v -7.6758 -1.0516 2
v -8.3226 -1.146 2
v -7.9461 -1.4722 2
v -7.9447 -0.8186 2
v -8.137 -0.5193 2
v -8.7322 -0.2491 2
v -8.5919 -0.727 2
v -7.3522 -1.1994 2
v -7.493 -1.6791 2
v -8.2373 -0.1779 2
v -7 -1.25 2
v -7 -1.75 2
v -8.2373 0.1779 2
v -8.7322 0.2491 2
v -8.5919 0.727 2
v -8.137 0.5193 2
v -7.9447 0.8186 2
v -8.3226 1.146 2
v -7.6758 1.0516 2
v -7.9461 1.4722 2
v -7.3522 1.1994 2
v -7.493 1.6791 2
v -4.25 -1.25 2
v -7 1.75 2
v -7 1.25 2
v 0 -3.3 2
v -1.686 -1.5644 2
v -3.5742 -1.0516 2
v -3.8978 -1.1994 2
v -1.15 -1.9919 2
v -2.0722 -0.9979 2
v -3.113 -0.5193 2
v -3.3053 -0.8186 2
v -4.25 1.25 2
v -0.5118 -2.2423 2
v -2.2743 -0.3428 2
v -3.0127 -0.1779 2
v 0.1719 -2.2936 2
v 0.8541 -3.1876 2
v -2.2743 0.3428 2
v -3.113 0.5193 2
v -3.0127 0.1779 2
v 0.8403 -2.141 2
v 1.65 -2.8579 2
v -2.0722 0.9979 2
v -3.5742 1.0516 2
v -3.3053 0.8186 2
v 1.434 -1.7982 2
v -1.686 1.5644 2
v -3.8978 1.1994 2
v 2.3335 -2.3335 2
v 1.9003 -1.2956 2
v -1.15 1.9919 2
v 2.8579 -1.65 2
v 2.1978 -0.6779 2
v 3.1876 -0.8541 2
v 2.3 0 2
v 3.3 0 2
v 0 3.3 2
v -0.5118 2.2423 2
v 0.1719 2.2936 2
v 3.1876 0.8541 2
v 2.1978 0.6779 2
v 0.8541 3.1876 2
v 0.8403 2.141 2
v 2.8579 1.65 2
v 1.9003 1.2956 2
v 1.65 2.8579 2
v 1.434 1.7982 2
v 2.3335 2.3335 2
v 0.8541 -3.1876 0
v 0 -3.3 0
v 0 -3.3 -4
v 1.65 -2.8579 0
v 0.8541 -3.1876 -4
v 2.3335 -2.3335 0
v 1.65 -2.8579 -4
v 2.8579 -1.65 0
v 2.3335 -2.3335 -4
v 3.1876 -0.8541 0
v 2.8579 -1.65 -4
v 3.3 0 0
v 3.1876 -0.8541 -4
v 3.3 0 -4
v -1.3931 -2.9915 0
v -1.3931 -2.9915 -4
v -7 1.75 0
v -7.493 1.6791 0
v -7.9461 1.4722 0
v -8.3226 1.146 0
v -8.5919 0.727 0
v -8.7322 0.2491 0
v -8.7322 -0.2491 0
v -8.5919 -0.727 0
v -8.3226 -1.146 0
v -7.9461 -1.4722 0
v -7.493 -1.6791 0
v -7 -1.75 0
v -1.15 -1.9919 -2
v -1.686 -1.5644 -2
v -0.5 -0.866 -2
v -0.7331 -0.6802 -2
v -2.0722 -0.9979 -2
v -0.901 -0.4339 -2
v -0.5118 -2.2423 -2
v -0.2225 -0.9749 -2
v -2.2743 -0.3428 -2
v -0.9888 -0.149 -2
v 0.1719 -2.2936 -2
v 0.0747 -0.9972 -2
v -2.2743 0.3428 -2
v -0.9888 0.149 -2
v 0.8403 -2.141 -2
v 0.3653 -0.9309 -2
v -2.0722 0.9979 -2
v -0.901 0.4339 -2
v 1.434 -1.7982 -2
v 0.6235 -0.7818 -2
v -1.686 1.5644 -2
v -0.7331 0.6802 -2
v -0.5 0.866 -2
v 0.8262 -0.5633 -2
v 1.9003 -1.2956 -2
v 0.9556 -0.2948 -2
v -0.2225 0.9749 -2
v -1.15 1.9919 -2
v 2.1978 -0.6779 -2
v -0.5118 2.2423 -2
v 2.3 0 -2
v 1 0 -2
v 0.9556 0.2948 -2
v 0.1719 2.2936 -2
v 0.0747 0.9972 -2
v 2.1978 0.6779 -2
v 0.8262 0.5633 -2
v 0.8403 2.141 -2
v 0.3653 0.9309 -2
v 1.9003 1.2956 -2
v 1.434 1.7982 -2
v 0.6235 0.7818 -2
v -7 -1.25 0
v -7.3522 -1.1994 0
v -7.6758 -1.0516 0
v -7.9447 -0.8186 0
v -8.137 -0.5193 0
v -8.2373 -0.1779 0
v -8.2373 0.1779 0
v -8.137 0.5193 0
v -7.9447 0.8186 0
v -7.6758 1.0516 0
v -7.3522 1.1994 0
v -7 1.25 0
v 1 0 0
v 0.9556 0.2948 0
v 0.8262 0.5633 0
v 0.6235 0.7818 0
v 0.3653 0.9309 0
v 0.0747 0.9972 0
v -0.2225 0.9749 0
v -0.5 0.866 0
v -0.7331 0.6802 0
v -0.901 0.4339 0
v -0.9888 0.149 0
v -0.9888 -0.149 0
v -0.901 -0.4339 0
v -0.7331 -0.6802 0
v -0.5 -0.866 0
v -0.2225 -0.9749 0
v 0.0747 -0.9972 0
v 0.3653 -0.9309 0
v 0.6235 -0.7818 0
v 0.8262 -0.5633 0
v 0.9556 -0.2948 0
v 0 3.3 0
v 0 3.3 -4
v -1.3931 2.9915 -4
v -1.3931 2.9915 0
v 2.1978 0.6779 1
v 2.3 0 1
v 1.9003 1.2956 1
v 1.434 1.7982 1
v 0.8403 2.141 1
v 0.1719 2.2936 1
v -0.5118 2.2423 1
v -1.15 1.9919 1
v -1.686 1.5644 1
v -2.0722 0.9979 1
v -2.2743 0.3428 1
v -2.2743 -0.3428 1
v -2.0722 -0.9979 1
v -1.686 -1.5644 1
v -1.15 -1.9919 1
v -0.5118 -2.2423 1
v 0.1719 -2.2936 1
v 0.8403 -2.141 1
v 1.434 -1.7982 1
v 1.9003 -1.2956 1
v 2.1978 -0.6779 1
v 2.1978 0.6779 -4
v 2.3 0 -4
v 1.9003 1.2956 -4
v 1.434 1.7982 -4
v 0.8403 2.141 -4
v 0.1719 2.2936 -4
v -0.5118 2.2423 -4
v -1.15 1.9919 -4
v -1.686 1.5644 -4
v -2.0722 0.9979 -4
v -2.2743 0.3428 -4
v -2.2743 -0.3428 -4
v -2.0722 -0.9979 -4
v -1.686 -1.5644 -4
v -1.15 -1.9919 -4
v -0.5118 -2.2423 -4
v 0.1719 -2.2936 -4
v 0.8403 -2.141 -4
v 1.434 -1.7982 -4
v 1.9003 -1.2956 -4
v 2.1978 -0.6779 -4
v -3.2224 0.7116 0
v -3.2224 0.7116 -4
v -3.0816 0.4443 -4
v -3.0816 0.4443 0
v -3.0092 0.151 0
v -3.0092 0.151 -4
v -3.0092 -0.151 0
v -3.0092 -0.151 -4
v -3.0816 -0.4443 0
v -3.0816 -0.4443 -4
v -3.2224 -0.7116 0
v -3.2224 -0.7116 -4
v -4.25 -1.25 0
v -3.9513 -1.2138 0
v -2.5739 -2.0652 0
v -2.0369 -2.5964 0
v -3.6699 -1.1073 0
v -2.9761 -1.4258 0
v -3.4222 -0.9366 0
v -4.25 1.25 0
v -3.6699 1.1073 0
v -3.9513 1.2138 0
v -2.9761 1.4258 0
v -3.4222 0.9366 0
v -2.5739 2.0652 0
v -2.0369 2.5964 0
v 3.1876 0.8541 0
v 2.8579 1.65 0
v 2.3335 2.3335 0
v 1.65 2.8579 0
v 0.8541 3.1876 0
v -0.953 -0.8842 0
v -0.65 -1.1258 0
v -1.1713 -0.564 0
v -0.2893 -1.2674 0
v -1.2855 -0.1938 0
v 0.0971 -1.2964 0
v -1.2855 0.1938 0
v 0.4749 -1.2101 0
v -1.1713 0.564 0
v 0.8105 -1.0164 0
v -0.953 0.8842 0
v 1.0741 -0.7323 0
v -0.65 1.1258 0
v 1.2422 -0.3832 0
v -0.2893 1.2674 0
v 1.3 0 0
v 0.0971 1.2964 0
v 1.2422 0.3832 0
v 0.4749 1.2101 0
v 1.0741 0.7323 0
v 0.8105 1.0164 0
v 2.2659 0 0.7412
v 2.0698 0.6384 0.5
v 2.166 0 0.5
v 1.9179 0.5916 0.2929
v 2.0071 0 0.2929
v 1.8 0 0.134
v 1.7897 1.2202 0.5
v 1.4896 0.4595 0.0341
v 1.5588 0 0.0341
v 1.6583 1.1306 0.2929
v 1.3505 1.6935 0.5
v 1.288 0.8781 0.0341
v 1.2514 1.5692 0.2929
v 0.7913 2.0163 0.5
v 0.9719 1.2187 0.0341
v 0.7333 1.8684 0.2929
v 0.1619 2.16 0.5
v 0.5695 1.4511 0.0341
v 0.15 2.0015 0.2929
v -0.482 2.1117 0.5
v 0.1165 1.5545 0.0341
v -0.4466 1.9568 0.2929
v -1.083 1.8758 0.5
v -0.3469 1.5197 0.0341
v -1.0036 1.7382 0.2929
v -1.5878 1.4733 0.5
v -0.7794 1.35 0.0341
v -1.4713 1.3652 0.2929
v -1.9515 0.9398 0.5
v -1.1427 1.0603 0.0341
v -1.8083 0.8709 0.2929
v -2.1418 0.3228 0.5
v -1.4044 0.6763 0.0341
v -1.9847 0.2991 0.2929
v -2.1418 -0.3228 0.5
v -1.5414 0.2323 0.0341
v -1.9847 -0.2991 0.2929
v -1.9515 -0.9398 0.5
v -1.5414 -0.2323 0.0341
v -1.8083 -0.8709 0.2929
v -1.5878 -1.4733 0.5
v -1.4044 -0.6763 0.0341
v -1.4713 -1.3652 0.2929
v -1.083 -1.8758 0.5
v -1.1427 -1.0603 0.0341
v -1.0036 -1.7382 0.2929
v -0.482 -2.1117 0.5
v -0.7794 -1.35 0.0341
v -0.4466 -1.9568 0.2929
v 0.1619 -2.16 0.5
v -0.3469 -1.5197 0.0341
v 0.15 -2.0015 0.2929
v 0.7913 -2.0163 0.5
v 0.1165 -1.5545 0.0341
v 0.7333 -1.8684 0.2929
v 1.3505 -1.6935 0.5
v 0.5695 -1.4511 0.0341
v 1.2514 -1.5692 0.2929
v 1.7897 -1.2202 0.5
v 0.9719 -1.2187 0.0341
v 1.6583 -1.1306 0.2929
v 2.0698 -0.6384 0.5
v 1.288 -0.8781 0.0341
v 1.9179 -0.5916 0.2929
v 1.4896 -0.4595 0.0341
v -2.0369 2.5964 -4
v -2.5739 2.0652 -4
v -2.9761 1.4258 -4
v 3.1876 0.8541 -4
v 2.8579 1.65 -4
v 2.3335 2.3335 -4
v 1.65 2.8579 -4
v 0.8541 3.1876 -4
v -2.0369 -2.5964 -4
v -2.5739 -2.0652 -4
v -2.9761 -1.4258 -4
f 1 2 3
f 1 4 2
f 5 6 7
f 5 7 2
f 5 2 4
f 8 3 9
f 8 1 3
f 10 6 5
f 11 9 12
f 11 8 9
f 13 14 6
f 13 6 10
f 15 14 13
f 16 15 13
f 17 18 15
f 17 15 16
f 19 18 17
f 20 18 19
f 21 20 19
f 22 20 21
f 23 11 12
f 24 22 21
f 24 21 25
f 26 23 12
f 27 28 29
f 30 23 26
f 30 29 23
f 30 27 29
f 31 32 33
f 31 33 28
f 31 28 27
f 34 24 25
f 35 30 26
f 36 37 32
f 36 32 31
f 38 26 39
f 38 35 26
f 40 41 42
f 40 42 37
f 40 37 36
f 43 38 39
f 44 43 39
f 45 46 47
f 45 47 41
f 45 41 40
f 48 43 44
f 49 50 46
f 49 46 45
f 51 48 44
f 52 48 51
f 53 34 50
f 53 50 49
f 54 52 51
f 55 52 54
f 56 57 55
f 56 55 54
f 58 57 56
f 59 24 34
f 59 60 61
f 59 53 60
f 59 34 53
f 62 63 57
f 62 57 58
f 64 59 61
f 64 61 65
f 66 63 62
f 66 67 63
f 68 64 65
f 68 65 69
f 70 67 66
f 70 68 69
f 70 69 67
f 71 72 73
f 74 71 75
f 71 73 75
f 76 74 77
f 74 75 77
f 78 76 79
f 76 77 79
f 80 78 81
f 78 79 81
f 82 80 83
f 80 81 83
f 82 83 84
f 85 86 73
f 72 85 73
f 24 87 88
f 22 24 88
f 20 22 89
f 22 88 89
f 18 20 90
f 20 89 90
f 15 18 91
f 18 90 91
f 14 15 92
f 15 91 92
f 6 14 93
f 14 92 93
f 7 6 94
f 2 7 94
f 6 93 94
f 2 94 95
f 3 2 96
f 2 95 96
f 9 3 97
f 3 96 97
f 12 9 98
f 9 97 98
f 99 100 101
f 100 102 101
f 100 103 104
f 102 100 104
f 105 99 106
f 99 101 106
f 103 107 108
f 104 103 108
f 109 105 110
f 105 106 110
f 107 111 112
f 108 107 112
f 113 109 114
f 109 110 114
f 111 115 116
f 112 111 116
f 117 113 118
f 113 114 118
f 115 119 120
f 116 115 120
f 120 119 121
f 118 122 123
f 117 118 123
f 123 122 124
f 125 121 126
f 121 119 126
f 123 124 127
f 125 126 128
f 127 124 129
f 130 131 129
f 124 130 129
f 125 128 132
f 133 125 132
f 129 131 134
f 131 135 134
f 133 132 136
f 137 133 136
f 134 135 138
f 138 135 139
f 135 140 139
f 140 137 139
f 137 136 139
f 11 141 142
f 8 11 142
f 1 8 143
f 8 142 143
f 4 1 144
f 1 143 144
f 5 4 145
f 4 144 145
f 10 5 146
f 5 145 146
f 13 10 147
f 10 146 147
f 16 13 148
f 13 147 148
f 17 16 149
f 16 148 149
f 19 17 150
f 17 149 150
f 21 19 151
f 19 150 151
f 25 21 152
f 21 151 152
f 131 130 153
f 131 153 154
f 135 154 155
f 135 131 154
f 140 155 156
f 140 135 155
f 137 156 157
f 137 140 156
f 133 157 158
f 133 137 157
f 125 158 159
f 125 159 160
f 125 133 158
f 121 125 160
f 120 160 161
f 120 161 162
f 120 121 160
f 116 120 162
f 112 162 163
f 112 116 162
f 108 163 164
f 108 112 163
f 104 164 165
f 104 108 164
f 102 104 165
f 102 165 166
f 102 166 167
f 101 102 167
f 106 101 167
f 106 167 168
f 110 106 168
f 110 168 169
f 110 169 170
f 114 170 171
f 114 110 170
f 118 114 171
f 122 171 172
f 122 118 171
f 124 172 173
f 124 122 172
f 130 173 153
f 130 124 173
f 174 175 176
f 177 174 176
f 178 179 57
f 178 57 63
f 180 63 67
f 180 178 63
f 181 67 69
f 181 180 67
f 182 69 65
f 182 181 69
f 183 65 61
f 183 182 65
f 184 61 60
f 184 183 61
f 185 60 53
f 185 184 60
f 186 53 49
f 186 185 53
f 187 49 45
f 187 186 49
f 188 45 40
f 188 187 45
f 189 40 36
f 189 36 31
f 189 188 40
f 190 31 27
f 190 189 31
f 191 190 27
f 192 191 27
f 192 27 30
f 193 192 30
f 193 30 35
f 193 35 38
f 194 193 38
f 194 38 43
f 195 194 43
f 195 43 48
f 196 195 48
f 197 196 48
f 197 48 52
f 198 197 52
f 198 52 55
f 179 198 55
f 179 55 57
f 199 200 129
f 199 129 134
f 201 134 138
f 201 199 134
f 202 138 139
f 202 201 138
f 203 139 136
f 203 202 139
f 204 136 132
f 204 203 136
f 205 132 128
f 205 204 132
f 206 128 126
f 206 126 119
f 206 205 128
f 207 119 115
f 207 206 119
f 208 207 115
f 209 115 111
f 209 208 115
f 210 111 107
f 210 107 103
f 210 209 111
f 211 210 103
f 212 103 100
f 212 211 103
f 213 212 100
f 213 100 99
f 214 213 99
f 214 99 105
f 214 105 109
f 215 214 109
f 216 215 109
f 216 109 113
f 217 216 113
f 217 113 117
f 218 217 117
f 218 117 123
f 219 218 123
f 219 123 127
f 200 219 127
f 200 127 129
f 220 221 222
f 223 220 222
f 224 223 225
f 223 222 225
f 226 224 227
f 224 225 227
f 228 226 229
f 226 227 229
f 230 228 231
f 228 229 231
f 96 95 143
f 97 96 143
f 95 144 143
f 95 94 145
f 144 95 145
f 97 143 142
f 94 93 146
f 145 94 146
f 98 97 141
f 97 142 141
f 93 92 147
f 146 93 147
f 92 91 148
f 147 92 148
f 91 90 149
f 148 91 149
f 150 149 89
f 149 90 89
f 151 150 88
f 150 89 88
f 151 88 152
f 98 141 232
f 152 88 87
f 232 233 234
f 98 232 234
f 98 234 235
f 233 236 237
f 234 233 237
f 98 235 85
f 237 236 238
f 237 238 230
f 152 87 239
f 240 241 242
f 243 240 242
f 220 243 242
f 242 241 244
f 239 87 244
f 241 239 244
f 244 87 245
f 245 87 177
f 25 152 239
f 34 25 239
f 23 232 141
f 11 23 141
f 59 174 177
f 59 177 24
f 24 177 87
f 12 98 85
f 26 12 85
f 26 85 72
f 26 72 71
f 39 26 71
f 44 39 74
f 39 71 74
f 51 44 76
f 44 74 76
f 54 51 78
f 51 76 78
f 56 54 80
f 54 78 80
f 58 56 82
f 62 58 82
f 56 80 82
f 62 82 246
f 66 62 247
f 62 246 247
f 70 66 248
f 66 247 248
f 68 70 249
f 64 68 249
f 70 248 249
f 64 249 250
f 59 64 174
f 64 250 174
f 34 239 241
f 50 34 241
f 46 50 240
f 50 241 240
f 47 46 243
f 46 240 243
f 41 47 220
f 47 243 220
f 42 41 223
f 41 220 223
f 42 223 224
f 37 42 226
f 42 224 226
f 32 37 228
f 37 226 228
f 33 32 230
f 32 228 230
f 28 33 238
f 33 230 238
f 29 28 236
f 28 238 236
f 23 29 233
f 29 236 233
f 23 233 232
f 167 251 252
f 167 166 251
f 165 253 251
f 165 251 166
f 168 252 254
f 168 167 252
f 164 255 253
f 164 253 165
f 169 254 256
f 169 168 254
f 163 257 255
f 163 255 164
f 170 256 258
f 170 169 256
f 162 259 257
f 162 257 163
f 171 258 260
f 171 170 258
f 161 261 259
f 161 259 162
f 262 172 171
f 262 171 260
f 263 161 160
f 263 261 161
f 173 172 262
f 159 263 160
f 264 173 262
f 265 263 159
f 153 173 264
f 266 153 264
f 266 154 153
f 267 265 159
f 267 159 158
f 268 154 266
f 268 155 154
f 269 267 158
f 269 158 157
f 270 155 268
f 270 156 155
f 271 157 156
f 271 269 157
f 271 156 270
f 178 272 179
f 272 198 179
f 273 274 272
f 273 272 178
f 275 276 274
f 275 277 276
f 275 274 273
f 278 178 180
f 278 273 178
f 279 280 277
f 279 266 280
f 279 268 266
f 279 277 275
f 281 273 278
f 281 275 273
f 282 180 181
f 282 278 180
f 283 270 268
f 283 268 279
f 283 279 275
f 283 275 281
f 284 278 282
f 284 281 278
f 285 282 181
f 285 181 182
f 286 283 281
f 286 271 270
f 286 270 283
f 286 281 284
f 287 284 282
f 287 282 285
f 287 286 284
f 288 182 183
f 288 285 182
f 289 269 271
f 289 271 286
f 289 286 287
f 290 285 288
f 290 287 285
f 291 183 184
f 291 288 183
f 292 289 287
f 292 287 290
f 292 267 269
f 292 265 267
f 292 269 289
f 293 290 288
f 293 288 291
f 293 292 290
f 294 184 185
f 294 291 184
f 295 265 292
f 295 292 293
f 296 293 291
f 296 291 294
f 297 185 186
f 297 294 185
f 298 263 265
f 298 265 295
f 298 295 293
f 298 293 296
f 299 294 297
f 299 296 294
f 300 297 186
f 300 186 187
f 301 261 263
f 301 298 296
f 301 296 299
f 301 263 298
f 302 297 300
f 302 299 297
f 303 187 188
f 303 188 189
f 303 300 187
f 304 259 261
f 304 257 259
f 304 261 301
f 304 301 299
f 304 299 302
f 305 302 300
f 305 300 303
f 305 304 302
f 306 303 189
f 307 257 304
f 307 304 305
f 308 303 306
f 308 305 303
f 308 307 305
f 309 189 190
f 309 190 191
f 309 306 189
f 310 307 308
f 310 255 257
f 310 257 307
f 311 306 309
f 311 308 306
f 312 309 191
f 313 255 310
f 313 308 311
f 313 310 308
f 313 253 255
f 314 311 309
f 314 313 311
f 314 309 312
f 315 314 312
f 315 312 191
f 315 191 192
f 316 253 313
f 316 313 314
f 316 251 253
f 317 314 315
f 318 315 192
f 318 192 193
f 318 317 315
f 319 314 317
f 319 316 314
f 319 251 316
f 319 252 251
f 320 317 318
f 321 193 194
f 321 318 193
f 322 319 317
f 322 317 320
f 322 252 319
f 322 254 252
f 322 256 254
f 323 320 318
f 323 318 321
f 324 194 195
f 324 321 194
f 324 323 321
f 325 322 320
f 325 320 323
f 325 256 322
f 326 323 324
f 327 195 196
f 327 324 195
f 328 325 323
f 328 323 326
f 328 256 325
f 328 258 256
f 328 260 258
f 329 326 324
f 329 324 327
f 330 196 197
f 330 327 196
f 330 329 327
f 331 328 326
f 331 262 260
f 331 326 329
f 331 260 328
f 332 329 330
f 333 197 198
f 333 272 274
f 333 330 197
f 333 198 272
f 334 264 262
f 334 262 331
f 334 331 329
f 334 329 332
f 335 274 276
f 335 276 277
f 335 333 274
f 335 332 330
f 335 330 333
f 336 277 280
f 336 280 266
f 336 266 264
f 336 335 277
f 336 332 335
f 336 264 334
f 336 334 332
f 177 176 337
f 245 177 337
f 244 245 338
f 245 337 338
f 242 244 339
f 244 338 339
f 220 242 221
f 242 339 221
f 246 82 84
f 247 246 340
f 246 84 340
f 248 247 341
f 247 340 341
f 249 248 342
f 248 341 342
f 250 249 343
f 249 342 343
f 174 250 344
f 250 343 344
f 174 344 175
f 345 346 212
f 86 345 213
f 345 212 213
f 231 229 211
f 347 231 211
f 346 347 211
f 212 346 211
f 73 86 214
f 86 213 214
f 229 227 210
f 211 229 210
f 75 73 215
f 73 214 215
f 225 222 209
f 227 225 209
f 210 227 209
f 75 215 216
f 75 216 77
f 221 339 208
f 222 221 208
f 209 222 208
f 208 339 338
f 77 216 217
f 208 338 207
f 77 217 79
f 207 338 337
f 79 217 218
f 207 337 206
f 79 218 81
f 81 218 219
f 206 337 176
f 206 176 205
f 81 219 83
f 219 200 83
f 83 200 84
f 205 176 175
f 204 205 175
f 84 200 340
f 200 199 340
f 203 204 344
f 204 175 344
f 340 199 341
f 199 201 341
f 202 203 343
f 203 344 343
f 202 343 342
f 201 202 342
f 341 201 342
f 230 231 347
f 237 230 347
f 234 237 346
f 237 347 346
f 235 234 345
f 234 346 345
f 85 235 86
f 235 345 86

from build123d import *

# Parameters (mm, degrees)
SKIZZE1_R                       = 2.3
AUFSATZ_LINEAR_AUSTRAGEN1_DEPTH = 2
AUFSATZ_LINEAR_START            = -4
SKIZZE1_11_R                    = 2.3
AUFSATZ_LINEAR_AUSTRAGEN2_DEPTH = 4
AUFSATZ_LINEAR_START_2          = -2
SKIZZE1_13_R                    = 2.3
SKIZZE1_13_R_2                  = 1
AUFSATZ_LINEAR_AUSTRAGEN3_DEPTH = 2
VERRUNDUNG1_R                   = 1


with BuildPart() as part:
    # Skizze1 → Aufsatz-Linear austragen1 (new body)
    with BuildSketch(Plane.XY):
        with BuildLine():
            ThreePointArc((-7, 1.75), (-8.75, 0), (-7, -1.75))
            Line((-7, -1.75), (0, -3.3))
            ThreePointArc((0, -3.3), (3.3, 0), (0, 3.3))
            Line((0, 3.3), (-7, 1.75))
        make_face()
        with BuildLine():
            ThreePointArc((-4.25, 1.25), (-3, 0), (-4.25, -1.25))
            Line((-4.25, -1.25), (-7, -1.25))
            ThreePointArc((-7, -1.25), (-8.25, 0), (-7, 1.25))
            Line((-7, 1.25), (-4.25, 1.25))
        make_face(mode=Mode.SUBTRACT)
        Circle(SKIZZE1_R, mode=Mode.SUBTRACT)
    extrude(amount=AUFSATZ_LINEAR_AUSTRAGEN1_DEPTH)

    # Skizze1<11> → Aufsatz-Linear austragen2 (add)
    with BuildSketch(Plane.XY.offset(AUFSATZ_LINEAR_START)):
        with BuildLine():
            Line((0, 3.3), (-1.393122903, 2.991522786))
            ThreePointArc((-1.393122903, 2.991522786), (-2.57392942, 2.065160367), (-3.222352941, 0.711647049))
            ThreePointArc((-3.222352941, 0.711647049), (-3, 0), (-3.222352941, -0.711647049))
            ThreePointArc((-3.222352941, -0.711647049), (-2.57392942, -2.065160367), (-1.393122903, -2.991522786))
            Line((-1.393122903, -2.991522786), (0, -3.3))
            ThreePointArc((0, -3.3), (2.333452378, -2.333452378), (3.3, 0))
            ThreePointArc((3.3, 0), (2.333452378, 2.333452378), (0, 3.3))
        make_face()
        Circle(SKIZZE1_11_R, mode=Mode.SUBTRACT)
    extrude(amount=AUFSATZ_LINEAR_AUSTRAGEN2_DEPTH)

    # Skizze1<13> → Aufsatz-Linear austragen3 (add)
    with BuildSketch(Plane.XY.offset(AUFSATZ_LINEAR_START_2)):
        Circle(SKIZZE1_13_R)
        Circle(SKIZZE1_13_R_2, mode=Mode.SUBTRACT)
    extrude(amount=AUFSATZ_LINEAR_AUSTRAGEN3_DEPTH)

    # Verrundung1
    verrundung1_edges = [part.edges().sort_by_distance(p)[0] for p in [
        (-2.3, 0, 0),
    ]]
    fillet(verrundung1_edges, radius=VERRUNDUNG1_R)


solid = part.part
